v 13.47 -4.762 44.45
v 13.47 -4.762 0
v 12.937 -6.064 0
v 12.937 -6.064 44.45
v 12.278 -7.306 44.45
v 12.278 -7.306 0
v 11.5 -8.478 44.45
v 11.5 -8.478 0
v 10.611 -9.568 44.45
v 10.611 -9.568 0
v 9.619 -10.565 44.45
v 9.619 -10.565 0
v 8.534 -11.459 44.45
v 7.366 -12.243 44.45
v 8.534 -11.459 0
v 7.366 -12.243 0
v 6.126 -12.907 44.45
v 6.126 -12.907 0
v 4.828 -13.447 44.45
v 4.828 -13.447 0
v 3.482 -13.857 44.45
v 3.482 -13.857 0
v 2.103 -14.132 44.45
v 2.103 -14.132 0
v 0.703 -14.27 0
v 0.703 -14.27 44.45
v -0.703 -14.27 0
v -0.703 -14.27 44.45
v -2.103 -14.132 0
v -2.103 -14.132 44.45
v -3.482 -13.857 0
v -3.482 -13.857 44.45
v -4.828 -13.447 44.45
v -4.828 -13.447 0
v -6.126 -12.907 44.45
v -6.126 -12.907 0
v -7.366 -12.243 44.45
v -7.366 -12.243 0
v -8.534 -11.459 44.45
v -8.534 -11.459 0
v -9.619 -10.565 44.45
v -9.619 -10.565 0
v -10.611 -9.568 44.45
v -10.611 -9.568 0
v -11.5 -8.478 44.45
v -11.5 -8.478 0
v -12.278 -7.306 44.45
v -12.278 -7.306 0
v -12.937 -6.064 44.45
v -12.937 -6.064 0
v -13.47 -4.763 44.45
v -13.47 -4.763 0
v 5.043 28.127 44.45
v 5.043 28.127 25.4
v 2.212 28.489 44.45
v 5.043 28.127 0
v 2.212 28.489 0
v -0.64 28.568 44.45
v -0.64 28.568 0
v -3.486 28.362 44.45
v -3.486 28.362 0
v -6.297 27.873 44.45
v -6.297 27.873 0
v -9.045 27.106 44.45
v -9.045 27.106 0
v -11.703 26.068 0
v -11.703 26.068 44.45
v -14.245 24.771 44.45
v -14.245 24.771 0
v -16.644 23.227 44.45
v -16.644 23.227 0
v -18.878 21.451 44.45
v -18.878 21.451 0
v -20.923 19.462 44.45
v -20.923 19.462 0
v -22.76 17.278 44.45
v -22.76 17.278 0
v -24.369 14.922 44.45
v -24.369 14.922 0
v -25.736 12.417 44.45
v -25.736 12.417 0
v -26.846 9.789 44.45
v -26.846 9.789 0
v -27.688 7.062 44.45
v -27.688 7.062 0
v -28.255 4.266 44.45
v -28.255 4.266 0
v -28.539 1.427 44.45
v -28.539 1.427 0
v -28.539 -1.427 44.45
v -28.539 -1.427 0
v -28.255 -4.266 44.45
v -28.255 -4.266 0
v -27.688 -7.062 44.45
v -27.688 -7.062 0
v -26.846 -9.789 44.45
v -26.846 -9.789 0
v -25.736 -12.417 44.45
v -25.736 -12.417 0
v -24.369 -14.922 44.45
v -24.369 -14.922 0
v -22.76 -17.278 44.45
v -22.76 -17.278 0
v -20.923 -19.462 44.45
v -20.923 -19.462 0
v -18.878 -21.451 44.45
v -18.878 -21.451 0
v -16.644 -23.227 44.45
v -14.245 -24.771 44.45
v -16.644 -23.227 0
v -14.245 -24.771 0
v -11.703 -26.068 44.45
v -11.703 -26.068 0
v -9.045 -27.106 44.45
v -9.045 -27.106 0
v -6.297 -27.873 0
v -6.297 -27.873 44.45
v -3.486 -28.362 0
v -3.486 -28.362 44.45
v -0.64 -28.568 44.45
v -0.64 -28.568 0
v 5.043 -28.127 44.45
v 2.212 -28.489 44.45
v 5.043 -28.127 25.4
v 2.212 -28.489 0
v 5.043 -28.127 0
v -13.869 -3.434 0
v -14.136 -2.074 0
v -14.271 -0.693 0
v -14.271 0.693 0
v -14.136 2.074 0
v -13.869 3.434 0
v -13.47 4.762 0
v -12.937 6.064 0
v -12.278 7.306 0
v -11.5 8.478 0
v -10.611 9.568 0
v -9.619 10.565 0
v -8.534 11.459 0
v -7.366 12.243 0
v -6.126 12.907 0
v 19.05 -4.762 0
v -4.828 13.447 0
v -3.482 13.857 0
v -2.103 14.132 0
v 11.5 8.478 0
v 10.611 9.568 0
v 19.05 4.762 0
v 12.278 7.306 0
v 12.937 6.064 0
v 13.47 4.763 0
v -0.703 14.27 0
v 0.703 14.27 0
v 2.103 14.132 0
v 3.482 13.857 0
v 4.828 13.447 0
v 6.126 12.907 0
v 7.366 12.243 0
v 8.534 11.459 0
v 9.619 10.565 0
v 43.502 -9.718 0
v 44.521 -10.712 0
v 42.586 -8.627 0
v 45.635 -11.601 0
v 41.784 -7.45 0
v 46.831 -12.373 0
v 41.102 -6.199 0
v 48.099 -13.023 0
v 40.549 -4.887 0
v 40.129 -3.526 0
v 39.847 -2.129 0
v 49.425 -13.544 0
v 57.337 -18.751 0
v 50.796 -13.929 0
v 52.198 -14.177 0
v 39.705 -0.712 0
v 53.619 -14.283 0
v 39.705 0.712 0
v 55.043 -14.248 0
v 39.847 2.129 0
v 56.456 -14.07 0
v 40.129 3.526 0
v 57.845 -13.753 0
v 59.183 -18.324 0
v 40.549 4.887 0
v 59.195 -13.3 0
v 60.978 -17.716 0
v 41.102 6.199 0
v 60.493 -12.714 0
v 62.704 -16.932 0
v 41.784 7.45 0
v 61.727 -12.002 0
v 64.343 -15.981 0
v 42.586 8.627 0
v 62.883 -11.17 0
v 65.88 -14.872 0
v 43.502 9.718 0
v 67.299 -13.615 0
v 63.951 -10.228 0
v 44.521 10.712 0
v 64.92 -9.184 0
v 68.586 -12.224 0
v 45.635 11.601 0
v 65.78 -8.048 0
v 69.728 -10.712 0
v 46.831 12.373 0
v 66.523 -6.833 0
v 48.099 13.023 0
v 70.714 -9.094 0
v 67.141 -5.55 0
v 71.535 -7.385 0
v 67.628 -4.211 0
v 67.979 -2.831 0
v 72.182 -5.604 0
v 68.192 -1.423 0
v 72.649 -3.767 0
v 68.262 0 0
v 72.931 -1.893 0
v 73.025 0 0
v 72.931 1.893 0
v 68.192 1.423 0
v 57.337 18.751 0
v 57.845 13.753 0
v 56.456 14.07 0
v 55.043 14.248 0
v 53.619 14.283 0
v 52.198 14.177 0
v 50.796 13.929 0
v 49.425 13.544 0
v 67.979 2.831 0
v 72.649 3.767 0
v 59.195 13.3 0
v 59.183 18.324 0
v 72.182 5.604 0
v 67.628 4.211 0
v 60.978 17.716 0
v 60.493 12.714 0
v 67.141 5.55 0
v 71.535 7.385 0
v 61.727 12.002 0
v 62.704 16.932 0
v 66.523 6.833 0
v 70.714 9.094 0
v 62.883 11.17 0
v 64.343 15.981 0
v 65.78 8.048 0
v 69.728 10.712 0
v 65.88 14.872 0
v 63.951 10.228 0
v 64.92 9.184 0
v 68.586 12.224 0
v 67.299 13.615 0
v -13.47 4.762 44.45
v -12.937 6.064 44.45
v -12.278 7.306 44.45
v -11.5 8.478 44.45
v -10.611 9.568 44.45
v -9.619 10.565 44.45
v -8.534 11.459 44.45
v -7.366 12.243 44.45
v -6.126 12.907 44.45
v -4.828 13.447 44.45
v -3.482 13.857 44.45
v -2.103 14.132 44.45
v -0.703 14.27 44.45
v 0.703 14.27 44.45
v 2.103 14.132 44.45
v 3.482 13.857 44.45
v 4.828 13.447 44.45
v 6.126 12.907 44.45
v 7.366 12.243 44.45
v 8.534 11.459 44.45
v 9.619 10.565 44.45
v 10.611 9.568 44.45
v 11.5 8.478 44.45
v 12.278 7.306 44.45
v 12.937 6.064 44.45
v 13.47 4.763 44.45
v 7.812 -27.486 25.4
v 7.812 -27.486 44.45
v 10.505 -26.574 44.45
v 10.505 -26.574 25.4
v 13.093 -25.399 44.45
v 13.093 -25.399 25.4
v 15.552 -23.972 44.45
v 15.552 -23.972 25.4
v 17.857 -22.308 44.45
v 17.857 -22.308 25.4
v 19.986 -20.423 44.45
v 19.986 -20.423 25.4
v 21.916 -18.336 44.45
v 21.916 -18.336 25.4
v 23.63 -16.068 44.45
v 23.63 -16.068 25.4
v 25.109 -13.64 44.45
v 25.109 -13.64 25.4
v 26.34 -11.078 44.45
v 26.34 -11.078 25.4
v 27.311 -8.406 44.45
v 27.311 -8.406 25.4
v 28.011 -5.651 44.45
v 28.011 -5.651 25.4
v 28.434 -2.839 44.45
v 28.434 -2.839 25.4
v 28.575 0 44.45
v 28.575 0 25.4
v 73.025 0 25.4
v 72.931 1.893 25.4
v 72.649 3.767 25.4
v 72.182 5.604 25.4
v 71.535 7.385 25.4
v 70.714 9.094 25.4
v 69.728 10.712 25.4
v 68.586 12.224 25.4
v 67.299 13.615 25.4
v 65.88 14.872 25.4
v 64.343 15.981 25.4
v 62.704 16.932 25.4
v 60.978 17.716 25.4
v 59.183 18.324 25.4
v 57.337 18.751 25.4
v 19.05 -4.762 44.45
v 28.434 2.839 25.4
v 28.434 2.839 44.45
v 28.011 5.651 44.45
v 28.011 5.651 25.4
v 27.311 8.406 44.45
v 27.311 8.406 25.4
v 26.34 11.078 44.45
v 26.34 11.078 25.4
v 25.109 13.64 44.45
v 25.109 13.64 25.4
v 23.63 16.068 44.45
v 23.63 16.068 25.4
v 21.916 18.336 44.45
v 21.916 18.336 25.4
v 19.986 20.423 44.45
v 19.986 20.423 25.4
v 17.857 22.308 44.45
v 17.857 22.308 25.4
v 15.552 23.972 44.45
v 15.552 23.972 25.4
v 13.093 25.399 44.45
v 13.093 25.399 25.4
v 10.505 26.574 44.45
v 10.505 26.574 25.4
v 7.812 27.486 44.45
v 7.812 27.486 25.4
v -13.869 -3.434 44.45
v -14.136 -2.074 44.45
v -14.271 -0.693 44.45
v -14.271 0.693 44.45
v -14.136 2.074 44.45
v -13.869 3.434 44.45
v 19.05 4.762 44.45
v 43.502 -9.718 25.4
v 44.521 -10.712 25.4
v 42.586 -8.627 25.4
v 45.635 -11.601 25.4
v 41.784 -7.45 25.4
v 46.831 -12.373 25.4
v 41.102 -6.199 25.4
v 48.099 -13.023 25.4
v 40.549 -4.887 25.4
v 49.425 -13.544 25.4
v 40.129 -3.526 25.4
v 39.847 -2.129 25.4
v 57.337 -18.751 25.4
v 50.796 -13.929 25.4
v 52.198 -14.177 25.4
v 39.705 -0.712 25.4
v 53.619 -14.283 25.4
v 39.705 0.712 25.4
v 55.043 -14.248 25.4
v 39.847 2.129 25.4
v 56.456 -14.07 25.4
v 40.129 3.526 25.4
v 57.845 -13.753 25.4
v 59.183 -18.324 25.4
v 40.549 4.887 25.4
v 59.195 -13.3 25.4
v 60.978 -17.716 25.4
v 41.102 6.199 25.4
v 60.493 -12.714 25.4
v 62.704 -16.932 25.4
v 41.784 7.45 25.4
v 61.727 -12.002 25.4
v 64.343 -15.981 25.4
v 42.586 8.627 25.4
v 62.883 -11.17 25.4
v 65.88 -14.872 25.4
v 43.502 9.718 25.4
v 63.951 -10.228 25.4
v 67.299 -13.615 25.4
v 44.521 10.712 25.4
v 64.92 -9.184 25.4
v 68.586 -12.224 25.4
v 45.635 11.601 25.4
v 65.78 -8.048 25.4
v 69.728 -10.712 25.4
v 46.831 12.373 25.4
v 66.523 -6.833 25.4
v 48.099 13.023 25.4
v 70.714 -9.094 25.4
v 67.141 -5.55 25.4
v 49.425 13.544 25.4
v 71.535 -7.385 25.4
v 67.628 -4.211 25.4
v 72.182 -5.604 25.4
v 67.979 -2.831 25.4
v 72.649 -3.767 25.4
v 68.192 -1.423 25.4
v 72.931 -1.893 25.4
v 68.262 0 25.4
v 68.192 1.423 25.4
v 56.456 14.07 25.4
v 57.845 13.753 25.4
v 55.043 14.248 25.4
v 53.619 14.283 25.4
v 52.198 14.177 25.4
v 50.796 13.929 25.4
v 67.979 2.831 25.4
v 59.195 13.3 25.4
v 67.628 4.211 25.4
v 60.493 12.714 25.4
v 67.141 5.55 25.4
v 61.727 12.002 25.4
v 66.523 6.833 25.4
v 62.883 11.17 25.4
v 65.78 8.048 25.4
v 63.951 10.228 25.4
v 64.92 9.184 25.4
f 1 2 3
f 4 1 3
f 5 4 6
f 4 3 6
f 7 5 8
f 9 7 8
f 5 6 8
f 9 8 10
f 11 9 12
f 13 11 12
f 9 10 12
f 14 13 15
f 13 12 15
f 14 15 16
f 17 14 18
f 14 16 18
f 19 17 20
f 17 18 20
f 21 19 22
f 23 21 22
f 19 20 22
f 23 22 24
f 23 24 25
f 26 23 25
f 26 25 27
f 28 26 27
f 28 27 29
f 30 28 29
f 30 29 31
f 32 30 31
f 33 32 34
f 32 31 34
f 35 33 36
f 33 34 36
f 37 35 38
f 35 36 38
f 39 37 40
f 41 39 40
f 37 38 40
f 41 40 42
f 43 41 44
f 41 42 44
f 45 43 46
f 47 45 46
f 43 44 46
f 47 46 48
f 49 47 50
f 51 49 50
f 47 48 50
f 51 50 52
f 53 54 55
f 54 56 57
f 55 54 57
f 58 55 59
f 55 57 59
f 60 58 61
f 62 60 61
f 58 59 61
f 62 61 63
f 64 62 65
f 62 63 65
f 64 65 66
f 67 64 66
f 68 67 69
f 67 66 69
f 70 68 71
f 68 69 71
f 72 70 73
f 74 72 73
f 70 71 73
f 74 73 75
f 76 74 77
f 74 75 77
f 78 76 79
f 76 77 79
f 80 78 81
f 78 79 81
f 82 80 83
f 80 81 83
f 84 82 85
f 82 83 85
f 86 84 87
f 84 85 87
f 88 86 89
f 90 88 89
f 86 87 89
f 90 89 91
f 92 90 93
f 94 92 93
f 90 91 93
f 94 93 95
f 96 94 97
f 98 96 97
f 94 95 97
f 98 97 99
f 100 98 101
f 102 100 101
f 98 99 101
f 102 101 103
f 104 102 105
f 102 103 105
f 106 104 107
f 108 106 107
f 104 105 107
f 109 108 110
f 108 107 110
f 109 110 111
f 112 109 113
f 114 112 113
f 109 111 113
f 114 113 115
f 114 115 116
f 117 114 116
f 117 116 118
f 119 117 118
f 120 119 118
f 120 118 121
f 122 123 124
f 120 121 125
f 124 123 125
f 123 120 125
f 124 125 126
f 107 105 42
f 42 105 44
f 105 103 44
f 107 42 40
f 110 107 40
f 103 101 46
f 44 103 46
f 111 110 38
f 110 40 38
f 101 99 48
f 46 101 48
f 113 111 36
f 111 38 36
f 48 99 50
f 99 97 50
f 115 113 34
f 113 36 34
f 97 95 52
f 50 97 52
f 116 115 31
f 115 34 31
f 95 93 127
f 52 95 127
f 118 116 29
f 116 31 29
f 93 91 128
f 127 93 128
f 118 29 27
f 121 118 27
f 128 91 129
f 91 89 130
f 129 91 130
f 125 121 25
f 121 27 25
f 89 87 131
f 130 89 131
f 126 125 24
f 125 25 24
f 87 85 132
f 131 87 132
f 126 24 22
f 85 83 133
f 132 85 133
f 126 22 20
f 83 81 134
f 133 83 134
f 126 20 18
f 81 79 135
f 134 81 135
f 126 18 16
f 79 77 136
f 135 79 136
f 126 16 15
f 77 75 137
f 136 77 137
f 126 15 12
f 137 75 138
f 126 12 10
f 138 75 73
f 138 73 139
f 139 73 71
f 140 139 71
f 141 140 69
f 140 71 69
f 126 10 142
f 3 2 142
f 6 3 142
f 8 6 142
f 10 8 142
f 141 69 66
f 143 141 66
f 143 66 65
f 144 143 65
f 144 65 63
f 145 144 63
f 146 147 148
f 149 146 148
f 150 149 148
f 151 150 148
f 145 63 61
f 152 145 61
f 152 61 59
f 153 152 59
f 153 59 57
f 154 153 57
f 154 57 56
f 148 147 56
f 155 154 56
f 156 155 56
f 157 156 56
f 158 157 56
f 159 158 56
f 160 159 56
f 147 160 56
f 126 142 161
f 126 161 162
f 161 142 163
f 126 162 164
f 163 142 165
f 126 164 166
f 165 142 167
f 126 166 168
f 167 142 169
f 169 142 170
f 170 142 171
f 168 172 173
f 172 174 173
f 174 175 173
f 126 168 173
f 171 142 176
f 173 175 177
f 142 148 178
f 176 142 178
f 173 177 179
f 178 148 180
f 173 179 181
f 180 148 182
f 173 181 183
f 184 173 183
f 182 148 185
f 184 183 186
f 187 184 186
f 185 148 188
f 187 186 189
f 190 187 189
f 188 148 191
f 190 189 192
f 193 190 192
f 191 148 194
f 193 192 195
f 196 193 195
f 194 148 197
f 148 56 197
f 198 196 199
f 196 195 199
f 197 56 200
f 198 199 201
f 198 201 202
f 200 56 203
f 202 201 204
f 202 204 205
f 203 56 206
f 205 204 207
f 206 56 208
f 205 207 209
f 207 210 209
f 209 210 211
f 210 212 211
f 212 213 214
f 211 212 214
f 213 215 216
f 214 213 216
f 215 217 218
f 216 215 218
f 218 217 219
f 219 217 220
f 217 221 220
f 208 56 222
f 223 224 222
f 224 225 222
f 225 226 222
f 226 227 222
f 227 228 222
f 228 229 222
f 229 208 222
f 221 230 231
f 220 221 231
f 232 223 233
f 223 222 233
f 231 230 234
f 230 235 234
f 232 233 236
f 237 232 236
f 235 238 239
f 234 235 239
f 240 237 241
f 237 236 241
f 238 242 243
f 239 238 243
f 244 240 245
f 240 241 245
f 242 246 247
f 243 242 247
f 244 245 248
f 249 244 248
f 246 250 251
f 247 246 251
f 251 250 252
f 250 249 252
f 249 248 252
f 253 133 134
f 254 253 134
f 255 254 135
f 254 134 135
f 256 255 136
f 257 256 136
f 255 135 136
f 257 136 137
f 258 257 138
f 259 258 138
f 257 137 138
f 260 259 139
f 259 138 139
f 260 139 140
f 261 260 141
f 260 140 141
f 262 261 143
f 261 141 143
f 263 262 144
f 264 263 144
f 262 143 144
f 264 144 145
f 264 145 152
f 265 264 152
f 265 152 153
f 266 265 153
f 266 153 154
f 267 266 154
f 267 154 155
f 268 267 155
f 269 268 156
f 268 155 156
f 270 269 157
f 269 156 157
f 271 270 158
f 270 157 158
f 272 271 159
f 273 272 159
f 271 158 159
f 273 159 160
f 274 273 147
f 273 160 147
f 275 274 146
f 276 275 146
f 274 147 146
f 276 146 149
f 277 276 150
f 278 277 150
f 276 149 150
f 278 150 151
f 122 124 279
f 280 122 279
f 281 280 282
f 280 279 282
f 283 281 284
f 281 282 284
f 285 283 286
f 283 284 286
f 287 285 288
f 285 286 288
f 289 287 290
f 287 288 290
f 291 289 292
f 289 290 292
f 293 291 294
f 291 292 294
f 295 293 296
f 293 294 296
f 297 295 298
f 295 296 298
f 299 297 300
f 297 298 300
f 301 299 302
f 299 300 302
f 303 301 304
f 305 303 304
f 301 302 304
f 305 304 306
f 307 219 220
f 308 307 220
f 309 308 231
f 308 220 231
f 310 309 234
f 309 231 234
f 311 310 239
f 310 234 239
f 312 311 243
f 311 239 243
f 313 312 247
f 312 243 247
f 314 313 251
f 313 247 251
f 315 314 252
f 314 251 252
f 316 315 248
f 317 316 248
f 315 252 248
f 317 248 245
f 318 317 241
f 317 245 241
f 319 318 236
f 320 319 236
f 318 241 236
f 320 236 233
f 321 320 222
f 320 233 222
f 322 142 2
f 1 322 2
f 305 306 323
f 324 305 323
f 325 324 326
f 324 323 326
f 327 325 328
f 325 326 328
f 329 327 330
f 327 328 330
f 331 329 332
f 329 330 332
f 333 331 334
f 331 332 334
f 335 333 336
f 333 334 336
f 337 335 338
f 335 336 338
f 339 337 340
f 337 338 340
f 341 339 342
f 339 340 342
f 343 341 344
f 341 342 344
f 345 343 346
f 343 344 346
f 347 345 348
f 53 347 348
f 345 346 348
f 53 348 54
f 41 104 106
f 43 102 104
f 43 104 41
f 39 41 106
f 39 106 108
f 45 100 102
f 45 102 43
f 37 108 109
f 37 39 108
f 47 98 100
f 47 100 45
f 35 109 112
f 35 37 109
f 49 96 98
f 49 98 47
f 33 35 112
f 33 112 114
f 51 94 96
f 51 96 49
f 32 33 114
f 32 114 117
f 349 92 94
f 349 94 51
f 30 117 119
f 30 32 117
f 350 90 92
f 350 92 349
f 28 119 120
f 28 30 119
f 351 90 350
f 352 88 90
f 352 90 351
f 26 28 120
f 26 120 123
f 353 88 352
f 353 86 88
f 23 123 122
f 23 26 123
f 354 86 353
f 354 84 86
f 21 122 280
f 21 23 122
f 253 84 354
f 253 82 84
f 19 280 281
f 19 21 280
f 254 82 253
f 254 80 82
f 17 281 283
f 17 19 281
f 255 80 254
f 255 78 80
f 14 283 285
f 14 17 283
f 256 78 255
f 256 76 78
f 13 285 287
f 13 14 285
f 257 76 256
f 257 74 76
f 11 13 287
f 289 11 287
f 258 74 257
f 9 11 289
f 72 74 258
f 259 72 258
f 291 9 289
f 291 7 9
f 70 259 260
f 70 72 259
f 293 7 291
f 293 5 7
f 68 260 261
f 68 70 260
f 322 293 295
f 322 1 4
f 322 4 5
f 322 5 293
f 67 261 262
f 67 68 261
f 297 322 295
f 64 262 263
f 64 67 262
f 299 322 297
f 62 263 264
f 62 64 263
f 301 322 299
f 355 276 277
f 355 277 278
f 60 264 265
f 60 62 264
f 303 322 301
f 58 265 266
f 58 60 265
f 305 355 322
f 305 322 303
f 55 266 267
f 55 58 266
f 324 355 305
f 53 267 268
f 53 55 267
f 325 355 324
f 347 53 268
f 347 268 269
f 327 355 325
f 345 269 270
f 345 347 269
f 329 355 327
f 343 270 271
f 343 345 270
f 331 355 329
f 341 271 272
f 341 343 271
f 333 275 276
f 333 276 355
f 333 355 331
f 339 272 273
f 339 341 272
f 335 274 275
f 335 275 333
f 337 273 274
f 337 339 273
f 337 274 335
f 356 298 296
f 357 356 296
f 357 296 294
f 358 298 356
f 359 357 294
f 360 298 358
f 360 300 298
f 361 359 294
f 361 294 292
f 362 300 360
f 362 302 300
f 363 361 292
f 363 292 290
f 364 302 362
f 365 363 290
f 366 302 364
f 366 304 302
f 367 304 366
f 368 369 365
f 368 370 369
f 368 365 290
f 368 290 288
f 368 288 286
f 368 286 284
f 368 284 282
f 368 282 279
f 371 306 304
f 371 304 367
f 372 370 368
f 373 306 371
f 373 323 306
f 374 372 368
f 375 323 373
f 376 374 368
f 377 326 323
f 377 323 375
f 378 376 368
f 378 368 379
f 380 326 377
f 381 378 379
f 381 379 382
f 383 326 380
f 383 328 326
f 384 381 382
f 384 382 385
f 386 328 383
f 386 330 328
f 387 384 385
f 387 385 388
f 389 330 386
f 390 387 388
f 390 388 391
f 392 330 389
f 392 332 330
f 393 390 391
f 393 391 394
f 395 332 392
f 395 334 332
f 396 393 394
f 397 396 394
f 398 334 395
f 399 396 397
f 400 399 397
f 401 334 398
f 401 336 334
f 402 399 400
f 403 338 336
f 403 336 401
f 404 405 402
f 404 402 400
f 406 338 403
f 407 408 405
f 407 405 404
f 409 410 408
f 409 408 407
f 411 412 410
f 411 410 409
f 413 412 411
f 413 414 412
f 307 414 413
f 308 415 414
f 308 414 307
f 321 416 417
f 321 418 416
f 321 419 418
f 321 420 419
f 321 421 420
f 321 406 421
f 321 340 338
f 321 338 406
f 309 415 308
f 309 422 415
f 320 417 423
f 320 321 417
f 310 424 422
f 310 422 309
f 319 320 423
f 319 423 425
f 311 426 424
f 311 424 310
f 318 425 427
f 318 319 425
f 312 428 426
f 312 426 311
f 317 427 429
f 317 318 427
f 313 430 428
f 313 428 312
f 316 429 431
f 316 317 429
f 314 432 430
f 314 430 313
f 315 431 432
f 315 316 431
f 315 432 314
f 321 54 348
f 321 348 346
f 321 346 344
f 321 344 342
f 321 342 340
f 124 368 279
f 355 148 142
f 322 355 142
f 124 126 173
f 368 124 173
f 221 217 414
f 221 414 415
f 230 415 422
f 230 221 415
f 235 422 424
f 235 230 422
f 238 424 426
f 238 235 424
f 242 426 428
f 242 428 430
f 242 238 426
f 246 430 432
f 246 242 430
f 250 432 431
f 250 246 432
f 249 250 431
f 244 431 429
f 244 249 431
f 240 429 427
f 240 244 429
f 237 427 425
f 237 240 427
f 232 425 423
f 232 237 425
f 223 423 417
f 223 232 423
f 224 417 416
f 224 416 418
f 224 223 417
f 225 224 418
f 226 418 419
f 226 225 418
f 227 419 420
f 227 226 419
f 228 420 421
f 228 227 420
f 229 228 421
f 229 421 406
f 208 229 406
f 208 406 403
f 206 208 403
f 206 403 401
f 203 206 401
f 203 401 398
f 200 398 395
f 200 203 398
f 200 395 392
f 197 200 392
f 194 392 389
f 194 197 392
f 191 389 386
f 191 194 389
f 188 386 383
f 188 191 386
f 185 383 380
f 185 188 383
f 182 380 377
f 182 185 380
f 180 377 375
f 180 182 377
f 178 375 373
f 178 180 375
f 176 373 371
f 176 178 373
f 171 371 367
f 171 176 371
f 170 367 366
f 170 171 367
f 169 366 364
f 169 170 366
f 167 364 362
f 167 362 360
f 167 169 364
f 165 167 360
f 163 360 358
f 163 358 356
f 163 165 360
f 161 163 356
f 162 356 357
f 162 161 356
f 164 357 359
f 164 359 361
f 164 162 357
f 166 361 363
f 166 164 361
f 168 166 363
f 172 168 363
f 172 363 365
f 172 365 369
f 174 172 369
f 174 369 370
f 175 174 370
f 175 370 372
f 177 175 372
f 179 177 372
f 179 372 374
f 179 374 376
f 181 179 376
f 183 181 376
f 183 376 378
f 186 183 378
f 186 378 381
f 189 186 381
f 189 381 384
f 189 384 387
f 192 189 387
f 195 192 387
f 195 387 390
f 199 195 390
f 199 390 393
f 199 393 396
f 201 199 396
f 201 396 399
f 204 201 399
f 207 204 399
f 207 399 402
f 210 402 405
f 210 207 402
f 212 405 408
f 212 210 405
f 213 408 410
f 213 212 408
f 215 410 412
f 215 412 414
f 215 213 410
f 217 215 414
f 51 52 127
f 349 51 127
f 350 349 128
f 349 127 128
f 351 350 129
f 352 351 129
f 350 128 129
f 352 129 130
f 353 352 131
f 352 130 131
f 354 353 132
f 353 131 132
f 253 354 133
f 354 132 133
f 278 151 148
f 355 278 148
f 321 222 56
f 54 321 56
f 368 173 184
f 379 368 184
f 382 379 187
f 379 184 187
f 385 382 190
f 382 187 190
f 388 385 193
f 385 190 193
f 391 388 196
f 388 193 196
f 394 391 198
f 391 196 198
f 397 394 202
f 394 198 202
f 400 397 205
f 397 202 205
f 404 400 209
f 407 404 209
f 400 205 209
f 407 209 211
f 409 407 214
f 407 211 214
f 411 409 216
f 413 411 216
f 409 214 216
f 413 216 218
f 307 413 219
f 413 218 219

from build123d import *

# Parameters (mm, degrees)
F0_R     = 14.2875
F1_DEPTH = 25.4
F2_DEPTH = 44.45


with BuildPart() as f1:
    # F0 (on Top) → F1 (new body)
    with BuildSketch(Plane.XY):
        with BuildLine():
            ThreePointArc((-13.470384, -4.7625), (-14.2875, 0), (-13.470384, 4.7625))
            Line((-13.470384, 4.7625), (-19.05, 4.7625))
            Line((-19.05, 4.7625), (-19.05, -4.7625))
            Line((-19.05, -4.7625), (-13.470384, -4.7625))
        make_face()
        with BuildLine():
            ThreePointArc((5.042647, 28.126541), (21.916025, 18.336262), (28.575, 0))
            ThreePointArc((28.575, 0), (21.916025, -18.336262), (5.042647, -28.126541))
            Line((5.042647, -28.126541), (57.336765, -18.751028))
            ThreePointArc((57.336765, -18.751028), (34.925, 0), (57.336765, 18.751028))
            Line((57.336765, 18.751028), (5.042647, 28.126541))
        make_face()
        with BuildLine():
            ThreePointArc((5.042647, -28.126541), (21.916025, -18.336262), (28.575, 0))
            ThreePointArc((28.575, 0), (21.916025, 18.336262), (5.042647, 28.126541))
            ThreePointArc((5.042647, 28.126541), (-28.575, 0), (5.042647, -28.126541))
        make_face()
        with BuildLine():
            ThreePointArc((-13.470384, 4.7625), (0, 14.2875), (13.470384, 4.7625))
            Line((13.470384, 4.7625), (19.05, 4.7625))
            Line((19.05, 4.7625), (19.05, -4.7625))
            Line((19.05, -4.7625), (13.470384, -4.7625))
            ThreePointArc((13.470384, -4.7625), (0, -14.2875), (-13.470384, -4.7625))
            Line((-13.470384, -4.7625), (-19.05, -4.7625))
            Line((-19.05, -4.7625), (-19.05, 4.7625))
            Line((-19.05, 4.7625), (-13.470384, 4.7625))
        make_face(mode=Mode.SUBTRACT)
        with BuildLine():
            ThreePointArc((73.025, 0), (68.585683, 12.224174), (57.336765, 18.751028))
            ThreePointArc((57.336765, 18.751028), (34.925, 0), (57.336765, -18.751028))
            ThreePointArc((57.336765, -18.751028), (68.585683, -12.224174), (73.025, 0))
        make_face()
        with Locations((53.975, 0)):
            Circle(F0_R, mode=Mode.SUBTRACT)
    extrude(amount=F1_DEPTH)

    # F0 (on Top) → F2 (join)
    with BuildSketch(Plane.XY):
        with BuildLine():
            ThreePointArc((5.042647, -28.126541), (21.916025, -18.336262), (28.575, 0))
            ThreePointArc((28.575, 0), (21.916025, 18.336262), (5.042647, 28.126541))
            ThreePointArc((5.042647, 28.126541), (-28.575, 0), (5.042647, -28.126541))
        make_face()
        with BuildLine():
            ThreePointArc((-13.470384, 4.7625), (0, 14.2875), (13.470384, 4.7625))
            Line((13.470384, 4.7625), (19.05, 4.7625))
            Line((19.05, 4.7625), (19.05, -4.7625))
            Line((19.05, -4.7625), (13.470384, -4.7625))
            ThreePointArc((13.470384, -4.7625), (0, -14.2875), (-13.470384, -4.7625))
            Line((-13.470384, -4.7625), (-19.05, -4.7625))
            Line((-19.05, -4.7625), (-19.05, 4.7625))
            Line((-19.05, 4.7625), (-13.470384, 4.7625))
        make_face(mode=Mode.SUBTRACT)
        with BuildLine():
            ThreePointArc((-13.470384, -4.7625), (-14.2875, 0), (-13.470384, 4.7625))
            Line((-13.470384, 4.7625), (-19.05, 4.7625))
            Line((-19.05, 4.7625), (-19.05, -4.7625))
            Line((-19.05, -4.7625), (-13.470384, -4.7625))
        make_face()
    extrude(amount=F2_DEPTH)


solid = f1.part
